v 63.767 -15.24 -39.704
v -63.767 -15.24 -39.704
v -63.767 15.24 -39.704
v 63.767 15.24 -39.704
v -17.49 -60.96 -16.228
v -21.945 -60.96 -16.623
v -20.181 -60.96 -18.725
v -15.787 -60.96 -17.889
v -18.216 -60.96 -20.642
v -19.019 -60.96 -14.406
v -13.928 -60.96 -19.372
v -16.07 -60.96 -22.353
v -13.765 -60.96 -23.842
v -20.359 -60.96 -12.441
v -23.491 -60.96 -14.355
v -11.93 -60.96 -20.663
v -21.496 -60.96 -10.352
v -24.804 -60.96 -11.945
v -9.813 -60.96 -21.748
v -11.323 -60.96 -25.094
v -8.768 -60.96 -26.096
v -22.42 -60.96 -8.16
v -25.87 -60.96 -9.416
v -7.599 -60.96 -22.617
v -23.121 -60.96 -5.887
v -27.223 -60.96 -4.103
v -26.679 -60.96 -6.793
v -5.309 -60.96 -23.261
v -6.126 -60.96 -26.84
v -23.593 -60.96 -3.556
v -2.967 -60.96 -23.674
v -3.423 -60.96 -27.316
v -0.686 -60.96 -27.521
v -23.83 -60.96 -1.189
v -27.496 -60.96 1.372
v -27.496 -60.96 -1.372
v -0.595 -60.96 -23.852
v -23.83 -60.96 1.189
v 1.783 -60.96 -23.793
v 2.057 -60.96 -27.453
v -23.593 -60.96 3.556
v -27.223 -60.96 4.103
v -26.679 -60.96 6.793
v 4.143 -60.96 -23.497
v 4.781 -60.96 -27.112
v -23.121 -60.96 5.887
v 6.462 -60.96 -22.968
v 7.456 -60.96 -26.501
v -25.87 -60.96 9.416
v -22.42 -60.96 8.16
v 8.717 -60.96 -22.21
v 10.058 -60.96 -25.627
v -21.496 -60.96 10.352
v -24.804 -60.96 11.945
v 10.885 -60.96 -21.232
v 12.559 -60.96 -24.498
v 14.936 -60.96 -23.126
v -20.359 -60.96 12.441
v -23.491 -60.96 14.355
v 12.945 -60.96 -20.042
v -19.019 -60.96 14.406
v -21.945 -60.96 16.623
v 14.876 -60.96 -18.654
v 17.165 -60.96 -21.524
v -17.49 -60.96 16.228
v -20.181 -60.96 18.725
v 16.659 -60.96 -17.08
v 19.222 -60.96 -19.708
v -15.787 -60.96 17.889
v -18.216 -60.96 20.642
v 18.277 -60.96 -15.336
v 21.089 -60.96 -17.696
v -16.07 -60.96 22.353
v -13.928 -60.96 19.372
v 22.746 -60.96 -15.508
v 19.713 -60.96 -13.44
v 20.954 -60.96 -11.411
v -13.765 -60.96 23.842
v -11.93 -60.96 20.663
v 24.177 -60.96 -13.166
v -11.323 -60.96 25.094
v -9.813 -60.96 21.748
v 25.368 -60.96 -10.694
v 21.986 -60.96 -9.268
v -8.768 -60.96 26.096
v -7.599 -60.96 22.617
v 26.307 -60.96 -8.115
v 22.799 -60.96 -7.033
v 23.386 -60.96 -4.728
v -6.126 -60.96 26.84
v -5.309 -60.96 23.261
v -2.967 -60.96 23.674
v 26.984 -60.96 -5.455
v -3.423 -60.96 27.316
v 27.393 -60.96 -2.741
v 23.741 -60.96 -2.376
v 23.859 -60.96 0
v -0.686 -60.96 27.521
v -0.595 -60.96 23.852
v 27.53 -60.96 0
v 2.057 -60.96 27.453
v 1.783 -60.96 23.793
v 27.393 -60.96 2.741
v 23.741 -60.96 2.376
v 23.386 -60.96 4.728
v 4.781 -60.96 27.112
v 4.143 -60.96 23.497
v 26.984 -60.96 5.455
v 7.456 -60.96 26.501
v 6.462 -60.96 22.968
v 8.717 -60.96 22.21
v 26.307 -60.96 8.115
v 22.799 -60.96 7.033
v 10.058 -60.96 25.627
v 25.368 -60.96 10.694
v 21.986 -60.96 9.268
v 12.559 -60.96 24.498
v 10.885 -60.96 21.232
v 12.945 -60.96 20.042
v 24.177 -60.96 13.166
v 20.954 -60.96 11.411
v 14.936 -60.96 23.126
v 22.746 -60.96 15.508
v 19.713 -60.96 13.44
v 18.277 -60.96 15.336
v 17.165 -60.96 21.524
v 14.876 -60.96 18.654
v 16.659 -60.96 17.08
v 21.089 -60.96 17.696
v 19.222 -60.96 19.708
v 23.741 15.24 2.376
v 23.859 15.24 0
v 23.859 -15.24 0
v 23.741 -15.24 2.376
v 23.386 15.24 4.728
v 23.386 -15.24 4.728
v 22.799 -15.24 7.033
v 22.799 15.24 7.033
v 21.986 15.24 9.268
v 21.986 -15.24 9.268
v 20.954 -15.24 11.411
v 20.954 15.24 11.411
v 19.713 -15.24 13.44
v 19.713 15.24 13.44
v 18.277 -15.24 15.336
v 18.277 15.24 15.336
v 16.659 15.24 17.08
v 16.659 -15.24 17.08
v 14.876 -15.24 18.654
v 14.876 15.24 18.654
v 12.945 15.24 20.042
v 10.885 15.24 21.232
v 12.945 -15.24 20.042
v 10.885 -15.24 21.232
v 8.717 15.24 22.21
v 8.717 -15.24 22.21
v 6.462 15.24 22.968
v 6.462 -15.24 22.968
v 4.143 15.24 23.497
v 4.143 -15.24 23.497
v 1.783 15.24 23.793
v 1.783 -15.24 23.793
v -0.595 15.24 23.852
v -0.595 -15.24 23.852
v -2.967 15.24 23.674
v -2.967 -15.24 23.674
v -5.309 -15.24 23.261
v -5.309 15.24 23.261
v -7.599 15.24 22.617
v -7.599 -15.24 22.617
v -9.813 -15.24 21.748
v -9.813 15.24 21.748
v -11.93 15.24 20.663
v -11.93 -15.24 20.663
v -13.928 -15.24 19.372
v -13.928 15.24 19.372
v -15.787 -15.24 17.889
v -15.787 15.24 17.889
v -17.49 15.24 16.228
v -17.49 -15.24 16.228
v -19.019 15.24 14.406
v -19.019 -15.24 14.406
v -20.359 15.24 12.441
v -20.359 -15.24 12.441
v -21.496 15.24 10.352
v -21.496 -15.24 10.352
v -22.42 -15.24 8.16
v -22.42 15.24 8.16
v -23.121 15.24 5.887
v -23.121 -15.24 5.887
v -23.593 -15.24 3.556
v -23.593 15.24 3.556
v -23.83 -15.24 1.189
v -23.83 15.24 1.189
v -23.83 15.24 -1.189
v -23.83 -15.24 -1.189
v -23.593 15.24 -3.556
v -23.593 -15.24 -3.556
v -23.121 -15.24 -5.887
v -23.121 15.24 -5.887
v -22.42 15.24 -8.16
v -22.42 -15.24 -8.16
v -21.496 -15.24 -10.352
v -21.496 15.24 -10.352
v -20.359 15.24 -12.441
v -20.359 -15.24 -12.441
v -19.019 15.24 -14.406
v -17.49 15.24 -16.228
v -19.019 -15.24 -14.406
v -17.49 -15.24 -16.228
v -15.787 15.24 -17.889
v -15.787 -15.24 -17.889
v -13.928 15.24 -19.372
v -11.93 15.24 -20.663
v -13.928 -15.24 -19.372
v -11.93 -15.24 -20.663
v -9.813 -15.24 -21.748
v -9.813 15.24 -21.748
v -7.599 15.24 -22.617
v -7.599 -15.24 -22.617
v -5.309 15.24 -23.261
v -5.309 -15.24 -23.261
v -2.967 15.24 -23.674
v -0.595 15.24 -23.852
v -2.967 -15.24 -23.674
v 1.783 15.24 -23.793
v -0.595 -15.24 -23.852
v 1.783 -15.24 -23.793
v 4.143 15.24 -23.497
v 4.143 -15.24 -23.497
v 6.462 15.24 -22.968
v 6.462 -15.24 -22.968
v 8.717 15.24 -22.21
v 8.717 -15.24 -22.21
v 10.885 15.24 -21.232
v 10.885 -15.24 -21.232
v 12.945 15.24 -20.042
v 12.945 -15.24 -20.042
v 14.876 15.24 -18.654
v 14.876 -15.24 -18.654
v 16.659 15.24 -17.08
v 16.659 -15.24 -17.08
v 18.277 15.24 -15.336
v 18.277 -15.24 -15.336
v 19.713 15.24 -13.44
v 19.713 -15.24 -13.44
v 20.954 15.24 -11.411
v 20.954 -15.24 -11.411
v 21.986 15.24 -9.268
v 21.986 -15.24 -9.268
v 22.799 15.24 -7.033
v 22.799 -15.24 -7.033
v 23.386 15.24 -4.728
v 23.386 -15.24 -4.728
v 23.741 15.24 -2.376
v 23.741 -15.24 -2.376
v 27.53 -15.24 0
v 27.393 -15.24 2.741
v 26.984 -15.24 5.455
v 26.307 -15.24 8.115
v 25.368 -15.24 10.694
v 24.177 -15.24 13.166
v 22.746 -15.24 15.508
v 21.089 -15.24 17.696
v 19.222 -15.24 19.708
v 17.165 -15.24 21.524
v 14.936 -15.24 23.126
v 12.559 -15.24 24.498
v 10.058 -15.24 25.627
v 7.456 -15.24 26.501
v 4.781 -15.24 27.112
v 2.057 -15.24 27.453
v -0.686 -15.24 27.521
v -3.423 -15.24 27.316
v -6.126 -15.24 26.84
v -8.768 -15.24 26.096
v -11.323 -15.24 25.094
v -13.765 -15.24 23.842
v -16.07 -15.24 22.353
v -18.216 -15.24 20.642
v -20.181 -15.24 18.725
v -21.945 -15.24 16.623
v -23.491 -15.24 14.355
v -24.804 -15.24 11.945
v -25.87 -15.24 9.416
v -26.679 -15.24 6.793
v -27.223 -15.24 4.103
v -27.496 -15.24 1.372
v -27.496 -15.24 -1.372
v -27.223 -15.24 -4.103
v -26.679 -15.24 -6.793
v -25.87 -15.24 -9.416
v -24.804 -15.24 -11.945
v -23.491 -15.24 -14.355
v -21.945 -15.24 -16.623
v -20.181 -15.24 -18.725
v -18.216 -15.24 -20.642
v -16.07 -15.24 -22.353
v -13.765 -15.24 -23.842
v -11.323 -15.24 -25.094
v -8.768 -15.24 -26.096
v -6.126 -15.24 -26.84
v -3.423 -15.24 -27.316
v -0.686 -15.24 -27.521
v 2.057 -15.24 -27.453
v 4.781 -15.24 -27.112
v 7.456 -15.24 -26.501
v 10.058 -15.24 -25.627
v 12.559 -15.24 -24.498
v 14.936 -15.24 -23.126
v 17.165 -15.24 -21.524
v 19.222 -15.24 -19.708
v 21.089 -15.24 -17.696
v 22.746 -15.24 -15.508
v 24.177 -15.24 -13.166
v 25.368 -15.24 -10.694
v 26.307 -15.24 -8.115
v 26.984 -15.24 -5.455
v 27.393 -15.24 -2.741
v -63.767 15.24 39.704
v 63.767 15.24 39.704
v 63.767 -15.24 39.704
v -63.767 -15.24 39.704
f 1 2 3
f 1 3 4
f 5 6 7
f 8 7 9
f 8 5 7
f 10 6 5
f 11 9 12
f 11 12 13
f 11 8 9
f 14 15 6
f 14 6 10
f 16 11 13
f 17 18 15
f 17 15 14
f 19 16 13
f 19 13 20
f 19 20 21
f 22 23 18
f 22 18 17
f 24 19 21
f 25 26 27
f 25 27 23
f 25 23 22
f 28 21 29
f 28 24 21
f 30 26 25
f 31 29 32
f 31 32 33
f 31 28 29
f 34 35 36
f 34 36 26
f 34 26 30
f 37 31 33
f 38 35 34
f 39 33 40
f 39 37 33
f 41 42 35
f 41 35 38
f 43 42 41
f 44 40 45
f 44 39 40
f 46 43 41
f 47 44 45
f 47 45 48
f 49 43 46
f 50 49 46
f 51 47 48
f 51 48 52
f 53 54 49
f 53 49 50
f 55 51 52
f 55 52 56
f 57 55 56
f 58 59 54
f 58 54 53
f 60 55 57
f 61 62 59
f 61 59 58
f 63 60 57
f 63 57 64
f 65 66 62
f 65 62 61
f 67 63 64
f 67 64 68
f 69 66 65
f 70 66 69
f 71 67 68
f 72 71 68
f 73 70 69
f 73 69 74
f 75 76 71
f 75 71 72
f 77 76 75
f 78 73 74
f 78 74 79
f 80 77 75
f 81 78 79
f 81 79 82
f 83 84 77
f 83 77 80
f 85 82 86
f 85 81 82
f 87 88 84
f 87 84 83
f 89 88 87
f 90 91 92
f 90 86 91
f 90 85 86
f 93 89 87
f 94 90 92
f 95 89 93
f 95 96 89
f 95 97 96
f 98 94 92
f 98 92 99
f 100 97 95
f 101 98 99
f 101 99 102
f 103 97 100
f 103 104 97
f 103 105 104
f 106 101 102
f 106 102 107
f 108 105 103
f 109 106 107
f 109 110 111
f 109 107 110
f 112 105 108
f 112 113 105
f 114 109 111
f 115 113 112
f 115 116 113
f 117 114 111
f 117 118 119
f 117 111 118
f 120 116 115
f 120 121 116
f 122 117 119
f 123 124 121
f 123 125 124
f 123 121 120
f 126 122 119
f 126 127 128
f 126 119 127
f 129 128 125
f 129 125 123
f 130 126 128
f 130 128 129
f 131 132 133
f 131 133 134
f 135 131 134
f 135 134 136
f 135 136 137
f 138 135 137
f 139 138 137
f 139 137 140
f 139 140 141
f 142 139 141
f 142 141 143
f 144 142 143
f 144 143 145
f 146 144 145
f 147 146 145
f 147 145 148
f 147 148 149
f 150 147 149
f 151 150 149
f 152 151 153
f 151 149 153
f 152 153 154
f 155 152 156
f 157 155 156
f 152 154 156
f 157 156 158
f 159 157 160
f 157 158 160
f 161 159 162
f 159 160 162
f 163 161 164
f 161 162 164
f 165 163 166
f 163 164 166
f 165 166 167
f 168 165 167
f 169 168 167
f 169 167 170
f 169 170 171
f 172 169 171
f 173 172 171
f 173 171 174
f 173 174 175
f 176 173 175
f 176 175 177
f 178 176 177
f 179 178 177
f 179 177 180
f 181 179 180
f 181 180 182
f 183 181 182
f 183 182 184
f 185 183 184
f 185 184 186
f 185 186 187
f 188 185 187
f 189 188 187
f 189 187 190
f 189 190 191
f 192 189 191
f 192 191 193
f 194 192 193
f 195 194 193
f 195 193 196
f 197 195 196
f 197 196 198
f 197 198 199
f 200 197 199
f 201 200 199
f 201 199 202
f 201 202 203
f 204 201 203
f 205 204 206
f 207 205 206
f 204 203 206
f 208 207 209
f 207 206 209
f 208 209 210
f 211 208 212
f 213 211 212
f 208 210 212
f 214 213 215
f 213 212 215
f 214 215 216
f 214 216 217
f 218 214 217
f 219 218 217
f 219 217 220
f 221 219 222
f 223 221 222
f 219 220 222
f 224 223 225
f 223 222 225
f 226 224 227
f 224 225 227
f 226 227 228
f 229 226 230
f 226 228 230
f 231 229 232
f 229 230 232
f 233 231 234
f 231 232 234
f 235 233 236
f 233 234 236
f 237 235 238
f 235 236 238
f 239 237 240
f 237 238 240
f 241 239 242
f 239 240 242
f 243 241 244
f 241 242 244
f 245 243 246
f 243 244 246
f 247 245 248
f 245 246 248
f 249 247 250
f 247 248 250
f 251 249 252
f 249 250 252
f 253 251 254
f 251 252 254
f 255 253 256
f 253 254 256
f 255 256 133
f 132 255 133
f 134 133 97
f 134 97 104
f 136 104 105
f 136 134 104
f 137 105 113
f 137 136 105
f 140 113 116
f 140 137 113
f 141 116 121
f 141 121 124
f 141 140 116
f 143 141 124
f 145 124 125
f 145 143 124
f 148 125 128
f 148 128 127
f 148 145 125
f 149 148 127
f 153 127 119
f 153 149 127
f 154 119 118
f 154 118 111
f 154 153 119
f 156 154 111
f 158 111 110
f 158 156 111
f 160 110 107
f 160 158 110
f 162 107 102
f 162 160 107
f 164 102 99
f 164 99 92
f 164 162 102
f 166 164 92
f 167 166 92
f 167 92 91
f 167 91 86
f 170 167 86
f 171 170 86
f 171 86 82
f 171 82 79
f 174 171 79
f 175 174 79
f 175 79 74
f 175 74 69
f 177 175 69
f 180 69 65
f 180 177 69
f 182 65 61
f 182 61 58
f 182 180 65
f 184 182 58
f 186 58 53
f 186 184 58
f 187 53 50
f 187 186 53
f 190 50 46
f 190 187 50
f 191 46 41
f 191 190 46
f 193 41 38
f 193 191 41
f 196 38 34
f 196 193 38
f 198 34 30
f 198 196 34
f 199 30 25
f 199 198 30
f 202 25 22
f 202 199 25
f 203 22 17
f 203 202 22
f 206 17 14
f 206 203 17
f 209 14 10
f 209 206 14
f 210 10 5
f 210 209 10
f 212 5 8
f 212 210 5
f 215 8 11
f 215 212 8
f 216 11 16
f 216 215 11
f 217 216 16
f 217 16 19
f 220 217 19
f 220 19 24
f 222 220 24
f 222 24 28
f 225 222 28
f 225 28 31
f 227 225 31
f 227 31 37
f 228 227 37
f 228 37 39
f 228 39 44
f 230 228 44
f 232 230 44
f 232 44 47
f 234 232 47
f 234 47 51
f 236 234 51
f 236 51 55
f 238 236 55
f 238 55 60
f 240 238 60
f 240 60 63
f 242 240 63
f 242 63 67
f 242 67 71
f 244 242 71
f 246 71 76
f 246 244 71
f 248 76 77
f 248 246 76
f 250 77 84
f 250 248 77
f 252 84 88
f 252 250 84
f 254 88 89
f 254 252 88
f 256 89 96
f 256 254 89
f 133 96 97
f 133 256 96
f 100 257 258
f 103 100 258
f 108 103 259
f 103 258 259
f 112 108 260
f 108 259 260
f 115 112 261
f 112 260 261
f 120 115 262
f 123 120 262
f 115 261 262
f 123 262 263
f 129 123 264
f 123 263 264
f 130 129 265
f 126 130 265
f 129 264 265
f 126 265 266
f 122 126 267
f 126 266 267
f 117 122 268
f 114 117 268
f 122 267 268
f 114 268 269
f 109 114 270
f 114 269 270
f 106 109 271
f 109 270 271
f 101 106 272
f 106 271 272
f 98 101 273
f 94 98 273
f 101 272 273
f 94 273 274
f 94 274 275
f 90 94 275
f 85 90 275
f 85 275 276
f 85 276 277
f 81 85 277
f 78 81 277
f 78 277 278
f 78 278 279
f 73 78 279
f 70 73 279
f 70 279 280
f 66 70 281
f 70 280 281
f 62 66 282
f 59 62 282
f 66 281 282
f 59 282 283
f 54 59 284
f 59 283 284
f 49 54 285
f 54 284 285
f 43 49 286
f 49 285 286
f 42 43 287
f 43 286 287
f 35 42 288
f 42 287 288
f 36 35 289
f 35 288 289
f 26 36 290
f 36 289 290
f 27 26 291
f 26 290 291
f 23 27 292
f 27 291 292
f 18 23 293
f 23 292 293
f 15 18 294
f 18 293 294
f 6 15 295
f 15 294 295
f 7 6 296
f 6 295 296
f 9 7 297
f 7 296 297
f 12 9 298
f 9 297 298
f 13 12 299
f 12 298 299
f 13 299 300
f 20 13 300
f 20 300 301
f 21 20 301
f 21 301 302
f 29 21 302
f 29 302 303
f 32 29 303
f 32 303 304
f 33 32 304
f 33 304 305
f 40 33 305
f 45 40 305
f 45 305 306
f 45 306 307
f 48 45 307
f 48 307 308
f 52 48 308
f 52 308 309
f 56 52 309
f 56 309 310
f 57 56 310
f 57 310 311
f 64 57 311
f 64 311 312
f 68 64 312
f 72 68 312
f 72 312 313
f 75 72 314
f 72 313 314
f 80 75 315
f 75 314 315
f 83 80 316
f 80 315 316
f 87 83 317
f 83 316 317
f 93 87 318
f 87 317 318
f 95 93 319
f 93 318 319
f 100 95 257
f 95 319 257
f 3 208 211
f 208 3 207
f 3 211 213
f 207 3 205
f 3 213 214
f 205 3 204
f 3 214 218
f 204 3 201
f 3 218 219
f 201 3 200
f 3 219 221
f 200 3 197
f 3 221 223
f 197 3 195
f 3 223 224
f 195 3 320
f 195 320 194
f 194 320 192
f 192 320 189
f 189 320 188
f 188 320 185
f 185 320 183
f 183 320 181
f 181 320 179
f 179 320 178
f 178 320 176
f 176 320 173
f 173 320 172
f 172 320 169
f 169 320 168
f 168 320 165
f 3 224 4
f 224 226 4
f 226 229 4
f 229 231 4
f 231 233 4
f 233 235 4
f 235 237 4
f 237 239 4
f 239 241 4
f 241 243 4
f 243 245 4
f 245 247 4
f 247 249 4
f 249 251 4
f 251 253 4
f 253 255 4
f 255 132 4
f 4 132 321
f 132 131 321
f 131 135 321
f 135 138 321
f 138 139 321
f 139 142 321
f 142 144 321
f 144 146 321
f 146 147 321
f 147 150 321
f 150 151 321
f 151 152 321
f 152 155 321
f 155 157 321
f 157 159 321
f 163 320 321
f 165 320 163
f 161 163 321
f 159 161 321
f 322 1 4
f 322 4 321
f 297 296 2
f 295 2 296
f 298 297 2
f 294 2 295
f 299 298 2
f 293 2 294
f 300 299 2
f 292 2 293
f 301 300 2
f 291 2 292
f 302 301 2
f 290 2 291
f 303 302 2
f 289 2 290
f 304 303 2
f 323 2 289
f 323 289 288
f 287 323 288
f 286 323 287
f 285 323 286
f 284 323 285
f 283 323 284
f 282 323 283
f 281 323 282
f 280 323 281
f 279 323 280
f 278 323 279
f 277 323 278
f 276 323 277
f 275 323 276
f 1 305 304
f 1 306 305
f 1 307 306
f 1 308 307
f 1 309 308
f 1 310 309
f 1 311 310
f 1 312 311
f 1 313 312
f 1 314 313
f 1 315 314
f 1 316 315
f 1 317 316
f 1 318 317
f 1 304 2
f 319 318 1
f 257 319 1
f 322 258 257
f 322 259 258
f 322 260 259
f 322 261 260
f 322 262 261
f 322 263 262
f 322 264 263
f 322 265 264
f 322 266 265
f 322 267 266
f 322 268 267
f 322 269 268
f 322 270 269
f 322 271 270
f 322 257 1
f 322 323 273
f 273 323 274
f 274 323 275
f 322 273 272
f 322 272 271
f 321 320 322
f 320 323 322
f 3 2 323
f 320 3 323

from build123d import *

# Parameters (mm, degrees)
F0_W      = 127.534748
F0_H      = 79.408422
F1_DEPTH  = 15.24
F2_R      = 27.530043
F2_R_2    = 23.859261
F3_DEPTH  = 45.72
F3_FACE_R = 23.859261
F4_DEPTH  = 46.99


with BuildPart() as f1:
    # F0 (on Front) → F1 (new body, symmetric)
    with BuildSketch(Plane.XZ):
        Rectangle(F0_W, F0_H)
    extrude(amount=F1_DEPTH, both=True)

    # F2 (on face) → F3 (join)
    with BuildSketch(Plane.XZ.offset(15.24)):
        Circle(F2_R)
        Circle(F2_R_2, mode=Mode.SUBTRACT)
    extrude(amount=F3_DEPTH)

    # F3_face (on face) → F4 (cut)
    with BuildSketch(Plane.XZ.offset(15.24)):
        Circle(F3_FACE_R)
    extrude(amount=-F4_DEPTH, mode=Mode.SUBTRACT)


solid = f1.part
